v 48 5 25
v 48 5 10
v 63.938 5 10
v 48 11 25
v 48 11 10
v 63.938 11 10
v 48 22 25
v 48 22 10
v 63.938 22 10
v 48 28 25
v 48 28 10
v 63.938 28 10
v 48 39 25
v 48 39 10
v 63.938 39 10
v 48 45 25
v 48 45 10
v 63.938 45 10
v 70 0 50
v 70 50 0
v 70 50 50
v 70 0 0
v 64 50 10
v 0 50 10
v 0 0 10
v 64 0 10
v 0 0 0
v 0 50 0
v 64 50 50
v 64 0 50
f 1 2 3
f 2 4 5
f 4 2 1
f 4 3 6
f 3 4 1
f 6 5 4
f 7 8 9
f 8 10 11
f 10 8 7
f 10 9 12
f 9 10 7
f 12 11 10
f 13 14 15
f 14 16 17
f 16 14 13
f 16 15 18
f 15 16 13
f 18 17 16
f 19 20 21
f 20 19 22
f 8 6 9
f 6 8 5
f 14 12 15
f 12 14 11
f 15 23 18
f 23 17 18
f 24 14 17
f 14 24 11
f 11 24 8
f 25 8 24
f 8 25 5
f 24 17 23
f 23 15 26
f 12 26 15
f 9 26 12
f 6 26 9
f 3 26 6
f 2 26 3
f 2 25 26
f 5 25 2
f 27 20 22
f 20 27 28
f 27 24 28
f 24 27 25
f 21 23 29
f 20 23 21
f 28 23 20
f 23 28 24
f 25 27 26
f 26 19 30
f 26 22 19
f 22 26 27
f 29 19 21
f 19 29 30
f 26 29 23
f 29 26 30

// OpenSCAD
$fn = 32;

// ----------------------------------------------------------------------
// Rib bracket: 3-gusset L bracket
// ----------------------------------------------------------------------

// --- parameters (mm) ---
base_l = 70;              // foot length, X
base_w = 50;              // foot width, Y
base_t = 10;              // foot thickness
plate_t = 6;              // upright plate thickness
plate_h = 50;             // overall height
gus_l = 16;               // gusset leg along the foot
gus_h = 16;               // gusset height
gus_t = 6;                // gusset thickness
gus_edge = 5;             // gusset margin from the foot edge
n_gus = 3;                // gusset count

gus_pitch = (base_w - 2 * gus_edge - gus_t) / (n_gus - 1);  // gusset pitch

union() {
  cube([base_l, base_w, base_t]);
  translate([base_l - plate_t, 0, base_t - 1])
    cube([plate_t, base_w, plate_h - base_t + 1]);
  for (i = [0 : n_gus - 1])
    translate([base_l - plate_t - gus_l, gus_edge + i * gus_pitch, base_t - 1])
      rotate([-90, 0, 0])
        linear_extrude(height = gus_t)
          polygon(points = [[0, 0], [gus_l + 1, 0], [0, -gus_h]]);
}
